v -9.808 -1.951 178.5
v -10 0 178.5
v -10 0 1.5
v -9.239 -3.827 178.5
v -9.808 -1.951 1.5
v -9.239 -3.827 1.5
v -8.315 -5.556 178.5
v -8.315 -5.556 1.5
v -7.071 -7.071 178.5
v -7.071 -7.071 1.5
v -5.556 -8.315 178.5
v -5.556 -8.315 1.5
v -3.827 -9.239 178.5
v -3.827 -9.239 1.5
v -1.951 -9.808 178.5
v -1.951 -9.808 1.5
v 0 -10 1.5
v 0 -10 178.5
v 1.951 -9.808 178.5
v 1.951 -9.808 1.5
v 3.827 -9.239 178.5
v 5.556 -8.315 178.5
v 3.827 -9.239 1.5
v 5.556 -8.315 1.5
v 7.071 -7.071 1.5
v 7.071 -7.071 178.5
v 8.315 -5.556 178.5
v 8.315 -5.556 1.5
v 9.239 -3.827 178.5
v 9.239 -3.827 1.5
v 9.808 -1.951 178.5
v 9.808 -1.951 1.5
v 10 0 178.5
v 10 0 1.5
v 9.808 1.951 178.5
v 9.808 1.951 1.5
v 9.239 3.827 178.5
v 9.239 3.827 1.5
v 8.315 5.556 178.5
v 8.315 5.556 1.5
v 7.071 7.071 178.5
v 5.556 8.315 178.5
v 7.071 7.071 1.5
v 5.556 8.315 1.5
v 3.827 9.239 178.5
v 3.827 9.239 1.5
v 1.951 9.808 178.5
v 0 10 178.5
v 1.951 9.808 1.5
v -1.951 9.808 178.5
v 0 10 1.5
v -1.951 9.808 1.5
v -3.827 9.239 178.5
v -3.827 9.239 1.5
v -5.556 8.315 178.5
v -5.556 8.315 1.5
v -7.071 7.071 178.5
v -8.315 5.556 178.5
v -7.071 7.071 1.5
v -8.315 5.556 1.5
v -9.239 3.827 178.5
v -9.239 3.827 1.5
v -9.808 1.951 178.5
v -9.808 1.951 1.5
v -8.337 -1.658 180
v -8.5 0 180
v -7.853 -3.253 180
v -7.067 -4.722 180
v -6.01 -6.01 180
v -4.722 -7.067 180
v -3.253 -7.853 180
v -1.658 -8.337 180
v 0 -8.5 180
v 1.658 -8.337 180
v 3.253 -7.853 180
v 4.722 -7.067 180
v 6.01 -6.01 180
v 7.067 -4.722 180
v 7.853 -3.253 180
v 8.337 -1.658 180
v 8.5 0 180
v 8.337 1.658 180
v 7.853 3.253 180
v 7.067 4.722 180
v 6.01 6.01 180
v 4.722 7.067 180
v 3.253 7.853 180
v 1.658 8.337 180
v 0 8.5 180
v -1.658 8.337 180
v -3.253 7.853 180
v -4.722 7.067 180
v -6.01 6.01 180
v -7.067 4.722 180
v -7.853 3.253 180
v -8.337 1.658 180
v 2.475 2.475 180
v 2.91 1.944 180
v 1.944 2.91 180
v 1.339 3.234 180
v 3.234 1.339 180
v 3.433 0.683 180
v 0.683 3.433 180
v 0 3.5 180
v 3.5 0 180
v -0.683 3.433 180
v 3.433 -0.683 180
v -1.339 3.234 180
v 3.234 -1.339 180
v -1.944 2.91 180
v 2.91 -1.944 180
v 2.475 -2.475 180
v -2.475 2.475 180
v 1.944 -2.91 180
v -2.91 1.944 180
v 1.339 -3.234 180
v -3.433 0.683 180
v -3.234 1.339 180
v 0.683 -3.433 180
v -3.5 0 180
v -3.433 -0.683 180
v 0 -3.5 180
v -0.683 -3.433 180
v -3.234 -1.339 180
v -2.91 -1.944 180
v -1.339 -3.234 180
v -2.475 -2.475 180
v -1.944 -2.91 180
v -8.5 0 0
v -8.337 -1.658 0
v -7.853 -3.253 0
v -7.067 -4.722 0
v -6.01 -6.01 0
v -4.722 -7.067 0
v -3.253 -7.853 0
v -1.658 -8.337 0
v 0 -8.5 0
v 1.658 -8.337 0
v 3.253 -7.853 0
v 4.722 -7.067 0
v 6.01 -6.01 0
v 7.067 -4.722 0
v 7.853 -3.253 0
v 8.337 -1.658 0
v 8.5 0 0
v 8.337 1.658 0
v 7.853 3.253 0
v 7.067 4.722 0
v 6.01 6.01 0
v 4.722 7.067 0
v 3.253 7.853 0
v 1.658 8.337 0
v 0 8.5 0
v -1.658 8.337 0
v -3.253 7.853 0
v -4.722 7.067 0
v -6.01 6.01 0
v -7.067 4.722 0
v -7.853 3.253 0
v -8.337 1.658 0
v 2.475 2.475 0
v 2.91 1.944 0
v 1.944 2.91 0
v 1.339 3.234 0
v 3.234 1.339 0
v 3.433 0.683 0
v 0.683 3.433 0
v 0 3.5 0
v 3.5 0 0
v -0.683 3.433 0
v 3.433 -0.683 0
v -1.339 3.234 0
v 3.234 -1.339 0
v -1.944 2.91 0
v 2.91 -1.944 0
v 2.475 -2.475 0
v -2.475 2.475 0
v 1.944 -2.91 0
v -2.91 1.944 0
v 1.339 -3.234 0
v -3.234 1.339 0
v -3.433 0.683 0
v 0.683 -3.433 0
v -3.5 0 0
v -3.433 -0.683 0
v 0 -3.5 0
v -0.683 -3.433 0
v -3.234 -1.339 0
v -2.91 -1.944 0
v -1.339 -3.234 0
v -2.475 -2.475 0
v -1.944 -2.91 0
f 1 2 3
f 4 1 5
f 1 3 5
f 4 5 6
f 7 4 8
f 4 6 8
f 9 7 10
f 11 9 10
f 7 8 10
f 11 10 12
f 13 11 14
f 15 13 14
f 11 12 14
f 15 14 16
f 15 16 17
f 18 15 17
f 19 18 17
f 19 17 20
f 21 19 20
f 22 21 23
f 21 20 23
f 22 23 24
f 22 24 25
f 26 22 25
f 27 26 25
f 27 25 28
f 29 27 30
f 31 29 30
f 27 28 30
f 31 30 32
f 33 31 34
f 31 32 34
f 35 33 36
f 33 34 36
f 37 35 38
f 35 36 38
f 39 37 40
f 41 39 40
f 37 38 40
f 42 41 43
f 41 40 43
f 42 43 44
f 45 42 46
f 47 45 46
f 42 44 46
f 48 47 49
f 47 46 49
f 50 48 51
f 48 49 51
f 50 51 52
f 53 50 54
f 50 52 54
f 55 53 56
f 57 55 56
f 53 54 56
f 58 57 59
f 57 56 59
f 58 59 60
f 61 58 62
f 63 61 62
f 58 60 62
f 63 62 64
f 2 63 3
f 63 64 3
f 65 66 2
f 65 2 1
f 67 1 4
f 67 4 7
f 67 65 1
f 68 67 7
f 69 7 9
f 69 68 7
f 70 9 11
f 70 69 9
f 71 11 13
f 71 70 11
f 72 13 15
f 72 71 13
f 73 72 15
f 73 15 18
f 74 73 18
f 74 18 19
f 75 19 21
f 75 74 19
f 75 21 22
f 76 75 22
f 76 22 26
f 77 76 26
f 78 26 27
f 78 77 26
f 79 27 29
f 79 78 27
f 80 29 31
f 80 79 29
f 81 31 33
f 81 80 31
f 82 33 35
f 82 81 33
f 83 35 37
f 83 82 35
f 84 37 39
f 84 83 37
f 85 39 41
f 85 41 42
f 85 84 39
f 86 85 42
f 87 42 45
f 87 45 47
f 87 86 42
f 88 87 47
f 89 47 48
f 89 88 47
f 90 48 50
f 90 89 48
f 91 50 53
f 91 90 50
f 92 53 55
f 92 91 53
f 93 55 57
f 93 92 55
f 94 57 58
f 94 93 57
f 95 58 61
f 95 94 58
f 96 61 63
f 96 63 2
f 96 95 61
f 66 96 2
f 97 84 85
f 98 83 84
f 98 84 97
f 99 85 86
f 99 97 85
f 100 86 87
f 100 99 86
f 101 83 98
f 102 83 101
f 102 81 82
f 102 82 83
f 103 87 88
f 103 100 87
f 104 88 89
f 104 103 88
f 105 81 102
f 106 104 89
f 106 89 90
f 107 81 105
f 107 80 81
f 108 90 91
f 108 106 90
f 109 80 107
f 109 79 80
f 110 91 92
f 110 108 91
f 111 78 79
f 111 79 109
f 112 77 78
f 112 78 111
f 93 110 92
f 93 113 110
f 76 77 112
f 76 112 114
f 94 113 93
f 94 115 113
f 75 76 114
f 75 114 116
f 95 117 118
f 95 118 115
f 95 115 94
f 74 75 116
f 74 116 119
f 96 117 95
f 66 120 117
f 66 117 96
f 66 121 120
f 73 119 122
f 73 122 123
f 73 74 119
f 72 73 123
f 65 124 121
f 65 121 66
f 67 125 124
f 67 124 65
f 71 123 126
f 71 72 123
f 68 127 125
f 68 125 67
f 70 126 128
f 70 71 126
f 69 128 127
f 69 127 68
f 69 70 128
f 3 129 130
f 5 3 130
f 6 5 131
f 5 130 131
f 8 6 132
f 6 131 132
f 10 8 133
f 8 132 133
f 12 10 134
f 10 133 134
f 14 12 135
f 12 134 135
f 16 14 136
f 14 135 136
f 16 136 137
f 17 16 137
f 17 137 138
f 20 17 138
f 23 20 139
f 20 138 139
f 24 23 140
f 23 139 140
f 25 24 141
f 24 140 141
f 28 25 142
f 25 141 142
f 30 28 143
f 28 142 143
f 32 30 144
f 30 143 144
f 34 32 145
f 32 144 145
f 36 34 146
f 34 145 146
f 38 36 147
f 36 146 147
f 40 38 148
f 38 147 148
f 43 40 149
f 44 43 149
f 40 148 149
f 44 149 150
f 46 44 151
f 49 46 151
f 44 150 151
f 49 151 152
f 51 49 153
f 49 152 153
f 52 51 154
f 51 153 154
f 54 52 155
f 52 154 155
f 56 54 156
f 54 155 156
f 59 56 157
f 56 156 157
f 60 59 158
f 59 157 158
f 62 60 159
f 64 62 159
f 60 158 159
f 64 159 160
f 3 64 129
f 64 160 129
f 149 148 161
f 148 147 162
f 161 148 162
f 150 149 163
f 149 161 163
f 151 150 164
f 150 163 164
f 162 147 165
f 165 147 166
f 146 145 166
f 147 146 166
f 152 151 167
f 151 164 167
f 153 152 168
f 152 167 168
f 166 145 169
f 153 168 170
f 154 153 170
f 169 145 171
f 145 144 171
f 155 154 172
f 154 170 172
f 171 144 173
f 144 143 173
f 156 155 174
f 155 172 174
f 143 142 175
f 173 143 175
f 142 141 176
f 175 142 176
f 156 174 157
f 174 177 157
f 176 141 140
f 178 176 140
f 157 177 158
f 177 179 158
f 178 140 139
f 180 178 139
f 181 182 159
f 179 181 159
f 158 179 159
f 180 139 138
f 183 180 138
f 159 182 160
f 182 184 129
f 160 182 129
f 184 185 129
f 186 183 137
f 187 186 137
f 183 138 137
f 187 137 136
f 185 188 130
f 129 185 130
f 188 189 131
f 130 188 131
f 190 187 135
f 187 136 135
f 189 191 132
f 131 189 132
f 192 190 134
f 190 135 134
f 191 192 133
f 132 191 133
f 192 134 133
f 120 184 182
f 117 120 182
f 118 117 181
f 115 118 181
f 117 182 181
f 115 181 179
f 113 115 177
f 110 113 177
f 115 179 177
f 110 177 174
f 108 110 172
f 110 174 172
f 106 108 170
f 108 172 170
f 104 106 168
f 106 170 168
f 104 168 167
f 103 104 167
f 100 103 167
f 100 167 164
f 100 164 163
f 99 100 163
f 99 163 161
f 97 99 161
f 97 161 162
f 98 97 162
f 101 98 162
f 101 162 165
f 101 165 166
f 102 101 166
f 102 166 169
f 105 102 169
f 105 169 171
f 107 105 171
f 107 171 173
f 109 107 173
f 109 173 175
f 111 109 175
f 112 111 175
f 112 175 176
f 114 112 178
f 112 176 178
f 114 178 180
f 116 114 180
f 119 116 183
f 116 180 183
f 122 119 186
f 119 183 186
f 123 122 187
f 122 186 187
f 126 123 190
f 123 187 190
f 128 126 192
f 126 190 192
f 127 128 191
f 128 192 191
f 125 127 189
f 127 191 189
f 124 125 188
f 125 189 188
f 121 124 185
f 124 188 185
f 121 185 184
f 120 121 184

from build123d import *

# Parameters (mm, degrees)
SKETCH_1_R      = 10
EXTRUDE_1_DEPTH = 180
CHAMFER_1_SIZE  = 1.5
M8X1_0_1_D      = 7


with BuildPart() as part:
    # 草图1 → 凸台-拉伸1 (new body)
    with BuildSketch(Plane.XY):
        with Locations(Location((0, 0, 0), (0, 0, 180))):
            Circle(SKETCH_1_R)
    extrude(amount=EXTRUDE_1_DEPTH)

    # 倒角1
    chamfer_1_edges = [part.edges().sort_by_distance(p)[0] for p in [
        (10, 0, 0),
        (10, 0, 180),
    ]]
    chamfer(chamfer_1_edges, length=CHAMFER_1_SIZE)

    # M8x1.0 螺纹孔1 (through all)
    with Locations(Plane.XY.offset(180)):
        with Locations((0, 0)):
            Hole(M8X1_0_1_D / 2)


solid = part.part
